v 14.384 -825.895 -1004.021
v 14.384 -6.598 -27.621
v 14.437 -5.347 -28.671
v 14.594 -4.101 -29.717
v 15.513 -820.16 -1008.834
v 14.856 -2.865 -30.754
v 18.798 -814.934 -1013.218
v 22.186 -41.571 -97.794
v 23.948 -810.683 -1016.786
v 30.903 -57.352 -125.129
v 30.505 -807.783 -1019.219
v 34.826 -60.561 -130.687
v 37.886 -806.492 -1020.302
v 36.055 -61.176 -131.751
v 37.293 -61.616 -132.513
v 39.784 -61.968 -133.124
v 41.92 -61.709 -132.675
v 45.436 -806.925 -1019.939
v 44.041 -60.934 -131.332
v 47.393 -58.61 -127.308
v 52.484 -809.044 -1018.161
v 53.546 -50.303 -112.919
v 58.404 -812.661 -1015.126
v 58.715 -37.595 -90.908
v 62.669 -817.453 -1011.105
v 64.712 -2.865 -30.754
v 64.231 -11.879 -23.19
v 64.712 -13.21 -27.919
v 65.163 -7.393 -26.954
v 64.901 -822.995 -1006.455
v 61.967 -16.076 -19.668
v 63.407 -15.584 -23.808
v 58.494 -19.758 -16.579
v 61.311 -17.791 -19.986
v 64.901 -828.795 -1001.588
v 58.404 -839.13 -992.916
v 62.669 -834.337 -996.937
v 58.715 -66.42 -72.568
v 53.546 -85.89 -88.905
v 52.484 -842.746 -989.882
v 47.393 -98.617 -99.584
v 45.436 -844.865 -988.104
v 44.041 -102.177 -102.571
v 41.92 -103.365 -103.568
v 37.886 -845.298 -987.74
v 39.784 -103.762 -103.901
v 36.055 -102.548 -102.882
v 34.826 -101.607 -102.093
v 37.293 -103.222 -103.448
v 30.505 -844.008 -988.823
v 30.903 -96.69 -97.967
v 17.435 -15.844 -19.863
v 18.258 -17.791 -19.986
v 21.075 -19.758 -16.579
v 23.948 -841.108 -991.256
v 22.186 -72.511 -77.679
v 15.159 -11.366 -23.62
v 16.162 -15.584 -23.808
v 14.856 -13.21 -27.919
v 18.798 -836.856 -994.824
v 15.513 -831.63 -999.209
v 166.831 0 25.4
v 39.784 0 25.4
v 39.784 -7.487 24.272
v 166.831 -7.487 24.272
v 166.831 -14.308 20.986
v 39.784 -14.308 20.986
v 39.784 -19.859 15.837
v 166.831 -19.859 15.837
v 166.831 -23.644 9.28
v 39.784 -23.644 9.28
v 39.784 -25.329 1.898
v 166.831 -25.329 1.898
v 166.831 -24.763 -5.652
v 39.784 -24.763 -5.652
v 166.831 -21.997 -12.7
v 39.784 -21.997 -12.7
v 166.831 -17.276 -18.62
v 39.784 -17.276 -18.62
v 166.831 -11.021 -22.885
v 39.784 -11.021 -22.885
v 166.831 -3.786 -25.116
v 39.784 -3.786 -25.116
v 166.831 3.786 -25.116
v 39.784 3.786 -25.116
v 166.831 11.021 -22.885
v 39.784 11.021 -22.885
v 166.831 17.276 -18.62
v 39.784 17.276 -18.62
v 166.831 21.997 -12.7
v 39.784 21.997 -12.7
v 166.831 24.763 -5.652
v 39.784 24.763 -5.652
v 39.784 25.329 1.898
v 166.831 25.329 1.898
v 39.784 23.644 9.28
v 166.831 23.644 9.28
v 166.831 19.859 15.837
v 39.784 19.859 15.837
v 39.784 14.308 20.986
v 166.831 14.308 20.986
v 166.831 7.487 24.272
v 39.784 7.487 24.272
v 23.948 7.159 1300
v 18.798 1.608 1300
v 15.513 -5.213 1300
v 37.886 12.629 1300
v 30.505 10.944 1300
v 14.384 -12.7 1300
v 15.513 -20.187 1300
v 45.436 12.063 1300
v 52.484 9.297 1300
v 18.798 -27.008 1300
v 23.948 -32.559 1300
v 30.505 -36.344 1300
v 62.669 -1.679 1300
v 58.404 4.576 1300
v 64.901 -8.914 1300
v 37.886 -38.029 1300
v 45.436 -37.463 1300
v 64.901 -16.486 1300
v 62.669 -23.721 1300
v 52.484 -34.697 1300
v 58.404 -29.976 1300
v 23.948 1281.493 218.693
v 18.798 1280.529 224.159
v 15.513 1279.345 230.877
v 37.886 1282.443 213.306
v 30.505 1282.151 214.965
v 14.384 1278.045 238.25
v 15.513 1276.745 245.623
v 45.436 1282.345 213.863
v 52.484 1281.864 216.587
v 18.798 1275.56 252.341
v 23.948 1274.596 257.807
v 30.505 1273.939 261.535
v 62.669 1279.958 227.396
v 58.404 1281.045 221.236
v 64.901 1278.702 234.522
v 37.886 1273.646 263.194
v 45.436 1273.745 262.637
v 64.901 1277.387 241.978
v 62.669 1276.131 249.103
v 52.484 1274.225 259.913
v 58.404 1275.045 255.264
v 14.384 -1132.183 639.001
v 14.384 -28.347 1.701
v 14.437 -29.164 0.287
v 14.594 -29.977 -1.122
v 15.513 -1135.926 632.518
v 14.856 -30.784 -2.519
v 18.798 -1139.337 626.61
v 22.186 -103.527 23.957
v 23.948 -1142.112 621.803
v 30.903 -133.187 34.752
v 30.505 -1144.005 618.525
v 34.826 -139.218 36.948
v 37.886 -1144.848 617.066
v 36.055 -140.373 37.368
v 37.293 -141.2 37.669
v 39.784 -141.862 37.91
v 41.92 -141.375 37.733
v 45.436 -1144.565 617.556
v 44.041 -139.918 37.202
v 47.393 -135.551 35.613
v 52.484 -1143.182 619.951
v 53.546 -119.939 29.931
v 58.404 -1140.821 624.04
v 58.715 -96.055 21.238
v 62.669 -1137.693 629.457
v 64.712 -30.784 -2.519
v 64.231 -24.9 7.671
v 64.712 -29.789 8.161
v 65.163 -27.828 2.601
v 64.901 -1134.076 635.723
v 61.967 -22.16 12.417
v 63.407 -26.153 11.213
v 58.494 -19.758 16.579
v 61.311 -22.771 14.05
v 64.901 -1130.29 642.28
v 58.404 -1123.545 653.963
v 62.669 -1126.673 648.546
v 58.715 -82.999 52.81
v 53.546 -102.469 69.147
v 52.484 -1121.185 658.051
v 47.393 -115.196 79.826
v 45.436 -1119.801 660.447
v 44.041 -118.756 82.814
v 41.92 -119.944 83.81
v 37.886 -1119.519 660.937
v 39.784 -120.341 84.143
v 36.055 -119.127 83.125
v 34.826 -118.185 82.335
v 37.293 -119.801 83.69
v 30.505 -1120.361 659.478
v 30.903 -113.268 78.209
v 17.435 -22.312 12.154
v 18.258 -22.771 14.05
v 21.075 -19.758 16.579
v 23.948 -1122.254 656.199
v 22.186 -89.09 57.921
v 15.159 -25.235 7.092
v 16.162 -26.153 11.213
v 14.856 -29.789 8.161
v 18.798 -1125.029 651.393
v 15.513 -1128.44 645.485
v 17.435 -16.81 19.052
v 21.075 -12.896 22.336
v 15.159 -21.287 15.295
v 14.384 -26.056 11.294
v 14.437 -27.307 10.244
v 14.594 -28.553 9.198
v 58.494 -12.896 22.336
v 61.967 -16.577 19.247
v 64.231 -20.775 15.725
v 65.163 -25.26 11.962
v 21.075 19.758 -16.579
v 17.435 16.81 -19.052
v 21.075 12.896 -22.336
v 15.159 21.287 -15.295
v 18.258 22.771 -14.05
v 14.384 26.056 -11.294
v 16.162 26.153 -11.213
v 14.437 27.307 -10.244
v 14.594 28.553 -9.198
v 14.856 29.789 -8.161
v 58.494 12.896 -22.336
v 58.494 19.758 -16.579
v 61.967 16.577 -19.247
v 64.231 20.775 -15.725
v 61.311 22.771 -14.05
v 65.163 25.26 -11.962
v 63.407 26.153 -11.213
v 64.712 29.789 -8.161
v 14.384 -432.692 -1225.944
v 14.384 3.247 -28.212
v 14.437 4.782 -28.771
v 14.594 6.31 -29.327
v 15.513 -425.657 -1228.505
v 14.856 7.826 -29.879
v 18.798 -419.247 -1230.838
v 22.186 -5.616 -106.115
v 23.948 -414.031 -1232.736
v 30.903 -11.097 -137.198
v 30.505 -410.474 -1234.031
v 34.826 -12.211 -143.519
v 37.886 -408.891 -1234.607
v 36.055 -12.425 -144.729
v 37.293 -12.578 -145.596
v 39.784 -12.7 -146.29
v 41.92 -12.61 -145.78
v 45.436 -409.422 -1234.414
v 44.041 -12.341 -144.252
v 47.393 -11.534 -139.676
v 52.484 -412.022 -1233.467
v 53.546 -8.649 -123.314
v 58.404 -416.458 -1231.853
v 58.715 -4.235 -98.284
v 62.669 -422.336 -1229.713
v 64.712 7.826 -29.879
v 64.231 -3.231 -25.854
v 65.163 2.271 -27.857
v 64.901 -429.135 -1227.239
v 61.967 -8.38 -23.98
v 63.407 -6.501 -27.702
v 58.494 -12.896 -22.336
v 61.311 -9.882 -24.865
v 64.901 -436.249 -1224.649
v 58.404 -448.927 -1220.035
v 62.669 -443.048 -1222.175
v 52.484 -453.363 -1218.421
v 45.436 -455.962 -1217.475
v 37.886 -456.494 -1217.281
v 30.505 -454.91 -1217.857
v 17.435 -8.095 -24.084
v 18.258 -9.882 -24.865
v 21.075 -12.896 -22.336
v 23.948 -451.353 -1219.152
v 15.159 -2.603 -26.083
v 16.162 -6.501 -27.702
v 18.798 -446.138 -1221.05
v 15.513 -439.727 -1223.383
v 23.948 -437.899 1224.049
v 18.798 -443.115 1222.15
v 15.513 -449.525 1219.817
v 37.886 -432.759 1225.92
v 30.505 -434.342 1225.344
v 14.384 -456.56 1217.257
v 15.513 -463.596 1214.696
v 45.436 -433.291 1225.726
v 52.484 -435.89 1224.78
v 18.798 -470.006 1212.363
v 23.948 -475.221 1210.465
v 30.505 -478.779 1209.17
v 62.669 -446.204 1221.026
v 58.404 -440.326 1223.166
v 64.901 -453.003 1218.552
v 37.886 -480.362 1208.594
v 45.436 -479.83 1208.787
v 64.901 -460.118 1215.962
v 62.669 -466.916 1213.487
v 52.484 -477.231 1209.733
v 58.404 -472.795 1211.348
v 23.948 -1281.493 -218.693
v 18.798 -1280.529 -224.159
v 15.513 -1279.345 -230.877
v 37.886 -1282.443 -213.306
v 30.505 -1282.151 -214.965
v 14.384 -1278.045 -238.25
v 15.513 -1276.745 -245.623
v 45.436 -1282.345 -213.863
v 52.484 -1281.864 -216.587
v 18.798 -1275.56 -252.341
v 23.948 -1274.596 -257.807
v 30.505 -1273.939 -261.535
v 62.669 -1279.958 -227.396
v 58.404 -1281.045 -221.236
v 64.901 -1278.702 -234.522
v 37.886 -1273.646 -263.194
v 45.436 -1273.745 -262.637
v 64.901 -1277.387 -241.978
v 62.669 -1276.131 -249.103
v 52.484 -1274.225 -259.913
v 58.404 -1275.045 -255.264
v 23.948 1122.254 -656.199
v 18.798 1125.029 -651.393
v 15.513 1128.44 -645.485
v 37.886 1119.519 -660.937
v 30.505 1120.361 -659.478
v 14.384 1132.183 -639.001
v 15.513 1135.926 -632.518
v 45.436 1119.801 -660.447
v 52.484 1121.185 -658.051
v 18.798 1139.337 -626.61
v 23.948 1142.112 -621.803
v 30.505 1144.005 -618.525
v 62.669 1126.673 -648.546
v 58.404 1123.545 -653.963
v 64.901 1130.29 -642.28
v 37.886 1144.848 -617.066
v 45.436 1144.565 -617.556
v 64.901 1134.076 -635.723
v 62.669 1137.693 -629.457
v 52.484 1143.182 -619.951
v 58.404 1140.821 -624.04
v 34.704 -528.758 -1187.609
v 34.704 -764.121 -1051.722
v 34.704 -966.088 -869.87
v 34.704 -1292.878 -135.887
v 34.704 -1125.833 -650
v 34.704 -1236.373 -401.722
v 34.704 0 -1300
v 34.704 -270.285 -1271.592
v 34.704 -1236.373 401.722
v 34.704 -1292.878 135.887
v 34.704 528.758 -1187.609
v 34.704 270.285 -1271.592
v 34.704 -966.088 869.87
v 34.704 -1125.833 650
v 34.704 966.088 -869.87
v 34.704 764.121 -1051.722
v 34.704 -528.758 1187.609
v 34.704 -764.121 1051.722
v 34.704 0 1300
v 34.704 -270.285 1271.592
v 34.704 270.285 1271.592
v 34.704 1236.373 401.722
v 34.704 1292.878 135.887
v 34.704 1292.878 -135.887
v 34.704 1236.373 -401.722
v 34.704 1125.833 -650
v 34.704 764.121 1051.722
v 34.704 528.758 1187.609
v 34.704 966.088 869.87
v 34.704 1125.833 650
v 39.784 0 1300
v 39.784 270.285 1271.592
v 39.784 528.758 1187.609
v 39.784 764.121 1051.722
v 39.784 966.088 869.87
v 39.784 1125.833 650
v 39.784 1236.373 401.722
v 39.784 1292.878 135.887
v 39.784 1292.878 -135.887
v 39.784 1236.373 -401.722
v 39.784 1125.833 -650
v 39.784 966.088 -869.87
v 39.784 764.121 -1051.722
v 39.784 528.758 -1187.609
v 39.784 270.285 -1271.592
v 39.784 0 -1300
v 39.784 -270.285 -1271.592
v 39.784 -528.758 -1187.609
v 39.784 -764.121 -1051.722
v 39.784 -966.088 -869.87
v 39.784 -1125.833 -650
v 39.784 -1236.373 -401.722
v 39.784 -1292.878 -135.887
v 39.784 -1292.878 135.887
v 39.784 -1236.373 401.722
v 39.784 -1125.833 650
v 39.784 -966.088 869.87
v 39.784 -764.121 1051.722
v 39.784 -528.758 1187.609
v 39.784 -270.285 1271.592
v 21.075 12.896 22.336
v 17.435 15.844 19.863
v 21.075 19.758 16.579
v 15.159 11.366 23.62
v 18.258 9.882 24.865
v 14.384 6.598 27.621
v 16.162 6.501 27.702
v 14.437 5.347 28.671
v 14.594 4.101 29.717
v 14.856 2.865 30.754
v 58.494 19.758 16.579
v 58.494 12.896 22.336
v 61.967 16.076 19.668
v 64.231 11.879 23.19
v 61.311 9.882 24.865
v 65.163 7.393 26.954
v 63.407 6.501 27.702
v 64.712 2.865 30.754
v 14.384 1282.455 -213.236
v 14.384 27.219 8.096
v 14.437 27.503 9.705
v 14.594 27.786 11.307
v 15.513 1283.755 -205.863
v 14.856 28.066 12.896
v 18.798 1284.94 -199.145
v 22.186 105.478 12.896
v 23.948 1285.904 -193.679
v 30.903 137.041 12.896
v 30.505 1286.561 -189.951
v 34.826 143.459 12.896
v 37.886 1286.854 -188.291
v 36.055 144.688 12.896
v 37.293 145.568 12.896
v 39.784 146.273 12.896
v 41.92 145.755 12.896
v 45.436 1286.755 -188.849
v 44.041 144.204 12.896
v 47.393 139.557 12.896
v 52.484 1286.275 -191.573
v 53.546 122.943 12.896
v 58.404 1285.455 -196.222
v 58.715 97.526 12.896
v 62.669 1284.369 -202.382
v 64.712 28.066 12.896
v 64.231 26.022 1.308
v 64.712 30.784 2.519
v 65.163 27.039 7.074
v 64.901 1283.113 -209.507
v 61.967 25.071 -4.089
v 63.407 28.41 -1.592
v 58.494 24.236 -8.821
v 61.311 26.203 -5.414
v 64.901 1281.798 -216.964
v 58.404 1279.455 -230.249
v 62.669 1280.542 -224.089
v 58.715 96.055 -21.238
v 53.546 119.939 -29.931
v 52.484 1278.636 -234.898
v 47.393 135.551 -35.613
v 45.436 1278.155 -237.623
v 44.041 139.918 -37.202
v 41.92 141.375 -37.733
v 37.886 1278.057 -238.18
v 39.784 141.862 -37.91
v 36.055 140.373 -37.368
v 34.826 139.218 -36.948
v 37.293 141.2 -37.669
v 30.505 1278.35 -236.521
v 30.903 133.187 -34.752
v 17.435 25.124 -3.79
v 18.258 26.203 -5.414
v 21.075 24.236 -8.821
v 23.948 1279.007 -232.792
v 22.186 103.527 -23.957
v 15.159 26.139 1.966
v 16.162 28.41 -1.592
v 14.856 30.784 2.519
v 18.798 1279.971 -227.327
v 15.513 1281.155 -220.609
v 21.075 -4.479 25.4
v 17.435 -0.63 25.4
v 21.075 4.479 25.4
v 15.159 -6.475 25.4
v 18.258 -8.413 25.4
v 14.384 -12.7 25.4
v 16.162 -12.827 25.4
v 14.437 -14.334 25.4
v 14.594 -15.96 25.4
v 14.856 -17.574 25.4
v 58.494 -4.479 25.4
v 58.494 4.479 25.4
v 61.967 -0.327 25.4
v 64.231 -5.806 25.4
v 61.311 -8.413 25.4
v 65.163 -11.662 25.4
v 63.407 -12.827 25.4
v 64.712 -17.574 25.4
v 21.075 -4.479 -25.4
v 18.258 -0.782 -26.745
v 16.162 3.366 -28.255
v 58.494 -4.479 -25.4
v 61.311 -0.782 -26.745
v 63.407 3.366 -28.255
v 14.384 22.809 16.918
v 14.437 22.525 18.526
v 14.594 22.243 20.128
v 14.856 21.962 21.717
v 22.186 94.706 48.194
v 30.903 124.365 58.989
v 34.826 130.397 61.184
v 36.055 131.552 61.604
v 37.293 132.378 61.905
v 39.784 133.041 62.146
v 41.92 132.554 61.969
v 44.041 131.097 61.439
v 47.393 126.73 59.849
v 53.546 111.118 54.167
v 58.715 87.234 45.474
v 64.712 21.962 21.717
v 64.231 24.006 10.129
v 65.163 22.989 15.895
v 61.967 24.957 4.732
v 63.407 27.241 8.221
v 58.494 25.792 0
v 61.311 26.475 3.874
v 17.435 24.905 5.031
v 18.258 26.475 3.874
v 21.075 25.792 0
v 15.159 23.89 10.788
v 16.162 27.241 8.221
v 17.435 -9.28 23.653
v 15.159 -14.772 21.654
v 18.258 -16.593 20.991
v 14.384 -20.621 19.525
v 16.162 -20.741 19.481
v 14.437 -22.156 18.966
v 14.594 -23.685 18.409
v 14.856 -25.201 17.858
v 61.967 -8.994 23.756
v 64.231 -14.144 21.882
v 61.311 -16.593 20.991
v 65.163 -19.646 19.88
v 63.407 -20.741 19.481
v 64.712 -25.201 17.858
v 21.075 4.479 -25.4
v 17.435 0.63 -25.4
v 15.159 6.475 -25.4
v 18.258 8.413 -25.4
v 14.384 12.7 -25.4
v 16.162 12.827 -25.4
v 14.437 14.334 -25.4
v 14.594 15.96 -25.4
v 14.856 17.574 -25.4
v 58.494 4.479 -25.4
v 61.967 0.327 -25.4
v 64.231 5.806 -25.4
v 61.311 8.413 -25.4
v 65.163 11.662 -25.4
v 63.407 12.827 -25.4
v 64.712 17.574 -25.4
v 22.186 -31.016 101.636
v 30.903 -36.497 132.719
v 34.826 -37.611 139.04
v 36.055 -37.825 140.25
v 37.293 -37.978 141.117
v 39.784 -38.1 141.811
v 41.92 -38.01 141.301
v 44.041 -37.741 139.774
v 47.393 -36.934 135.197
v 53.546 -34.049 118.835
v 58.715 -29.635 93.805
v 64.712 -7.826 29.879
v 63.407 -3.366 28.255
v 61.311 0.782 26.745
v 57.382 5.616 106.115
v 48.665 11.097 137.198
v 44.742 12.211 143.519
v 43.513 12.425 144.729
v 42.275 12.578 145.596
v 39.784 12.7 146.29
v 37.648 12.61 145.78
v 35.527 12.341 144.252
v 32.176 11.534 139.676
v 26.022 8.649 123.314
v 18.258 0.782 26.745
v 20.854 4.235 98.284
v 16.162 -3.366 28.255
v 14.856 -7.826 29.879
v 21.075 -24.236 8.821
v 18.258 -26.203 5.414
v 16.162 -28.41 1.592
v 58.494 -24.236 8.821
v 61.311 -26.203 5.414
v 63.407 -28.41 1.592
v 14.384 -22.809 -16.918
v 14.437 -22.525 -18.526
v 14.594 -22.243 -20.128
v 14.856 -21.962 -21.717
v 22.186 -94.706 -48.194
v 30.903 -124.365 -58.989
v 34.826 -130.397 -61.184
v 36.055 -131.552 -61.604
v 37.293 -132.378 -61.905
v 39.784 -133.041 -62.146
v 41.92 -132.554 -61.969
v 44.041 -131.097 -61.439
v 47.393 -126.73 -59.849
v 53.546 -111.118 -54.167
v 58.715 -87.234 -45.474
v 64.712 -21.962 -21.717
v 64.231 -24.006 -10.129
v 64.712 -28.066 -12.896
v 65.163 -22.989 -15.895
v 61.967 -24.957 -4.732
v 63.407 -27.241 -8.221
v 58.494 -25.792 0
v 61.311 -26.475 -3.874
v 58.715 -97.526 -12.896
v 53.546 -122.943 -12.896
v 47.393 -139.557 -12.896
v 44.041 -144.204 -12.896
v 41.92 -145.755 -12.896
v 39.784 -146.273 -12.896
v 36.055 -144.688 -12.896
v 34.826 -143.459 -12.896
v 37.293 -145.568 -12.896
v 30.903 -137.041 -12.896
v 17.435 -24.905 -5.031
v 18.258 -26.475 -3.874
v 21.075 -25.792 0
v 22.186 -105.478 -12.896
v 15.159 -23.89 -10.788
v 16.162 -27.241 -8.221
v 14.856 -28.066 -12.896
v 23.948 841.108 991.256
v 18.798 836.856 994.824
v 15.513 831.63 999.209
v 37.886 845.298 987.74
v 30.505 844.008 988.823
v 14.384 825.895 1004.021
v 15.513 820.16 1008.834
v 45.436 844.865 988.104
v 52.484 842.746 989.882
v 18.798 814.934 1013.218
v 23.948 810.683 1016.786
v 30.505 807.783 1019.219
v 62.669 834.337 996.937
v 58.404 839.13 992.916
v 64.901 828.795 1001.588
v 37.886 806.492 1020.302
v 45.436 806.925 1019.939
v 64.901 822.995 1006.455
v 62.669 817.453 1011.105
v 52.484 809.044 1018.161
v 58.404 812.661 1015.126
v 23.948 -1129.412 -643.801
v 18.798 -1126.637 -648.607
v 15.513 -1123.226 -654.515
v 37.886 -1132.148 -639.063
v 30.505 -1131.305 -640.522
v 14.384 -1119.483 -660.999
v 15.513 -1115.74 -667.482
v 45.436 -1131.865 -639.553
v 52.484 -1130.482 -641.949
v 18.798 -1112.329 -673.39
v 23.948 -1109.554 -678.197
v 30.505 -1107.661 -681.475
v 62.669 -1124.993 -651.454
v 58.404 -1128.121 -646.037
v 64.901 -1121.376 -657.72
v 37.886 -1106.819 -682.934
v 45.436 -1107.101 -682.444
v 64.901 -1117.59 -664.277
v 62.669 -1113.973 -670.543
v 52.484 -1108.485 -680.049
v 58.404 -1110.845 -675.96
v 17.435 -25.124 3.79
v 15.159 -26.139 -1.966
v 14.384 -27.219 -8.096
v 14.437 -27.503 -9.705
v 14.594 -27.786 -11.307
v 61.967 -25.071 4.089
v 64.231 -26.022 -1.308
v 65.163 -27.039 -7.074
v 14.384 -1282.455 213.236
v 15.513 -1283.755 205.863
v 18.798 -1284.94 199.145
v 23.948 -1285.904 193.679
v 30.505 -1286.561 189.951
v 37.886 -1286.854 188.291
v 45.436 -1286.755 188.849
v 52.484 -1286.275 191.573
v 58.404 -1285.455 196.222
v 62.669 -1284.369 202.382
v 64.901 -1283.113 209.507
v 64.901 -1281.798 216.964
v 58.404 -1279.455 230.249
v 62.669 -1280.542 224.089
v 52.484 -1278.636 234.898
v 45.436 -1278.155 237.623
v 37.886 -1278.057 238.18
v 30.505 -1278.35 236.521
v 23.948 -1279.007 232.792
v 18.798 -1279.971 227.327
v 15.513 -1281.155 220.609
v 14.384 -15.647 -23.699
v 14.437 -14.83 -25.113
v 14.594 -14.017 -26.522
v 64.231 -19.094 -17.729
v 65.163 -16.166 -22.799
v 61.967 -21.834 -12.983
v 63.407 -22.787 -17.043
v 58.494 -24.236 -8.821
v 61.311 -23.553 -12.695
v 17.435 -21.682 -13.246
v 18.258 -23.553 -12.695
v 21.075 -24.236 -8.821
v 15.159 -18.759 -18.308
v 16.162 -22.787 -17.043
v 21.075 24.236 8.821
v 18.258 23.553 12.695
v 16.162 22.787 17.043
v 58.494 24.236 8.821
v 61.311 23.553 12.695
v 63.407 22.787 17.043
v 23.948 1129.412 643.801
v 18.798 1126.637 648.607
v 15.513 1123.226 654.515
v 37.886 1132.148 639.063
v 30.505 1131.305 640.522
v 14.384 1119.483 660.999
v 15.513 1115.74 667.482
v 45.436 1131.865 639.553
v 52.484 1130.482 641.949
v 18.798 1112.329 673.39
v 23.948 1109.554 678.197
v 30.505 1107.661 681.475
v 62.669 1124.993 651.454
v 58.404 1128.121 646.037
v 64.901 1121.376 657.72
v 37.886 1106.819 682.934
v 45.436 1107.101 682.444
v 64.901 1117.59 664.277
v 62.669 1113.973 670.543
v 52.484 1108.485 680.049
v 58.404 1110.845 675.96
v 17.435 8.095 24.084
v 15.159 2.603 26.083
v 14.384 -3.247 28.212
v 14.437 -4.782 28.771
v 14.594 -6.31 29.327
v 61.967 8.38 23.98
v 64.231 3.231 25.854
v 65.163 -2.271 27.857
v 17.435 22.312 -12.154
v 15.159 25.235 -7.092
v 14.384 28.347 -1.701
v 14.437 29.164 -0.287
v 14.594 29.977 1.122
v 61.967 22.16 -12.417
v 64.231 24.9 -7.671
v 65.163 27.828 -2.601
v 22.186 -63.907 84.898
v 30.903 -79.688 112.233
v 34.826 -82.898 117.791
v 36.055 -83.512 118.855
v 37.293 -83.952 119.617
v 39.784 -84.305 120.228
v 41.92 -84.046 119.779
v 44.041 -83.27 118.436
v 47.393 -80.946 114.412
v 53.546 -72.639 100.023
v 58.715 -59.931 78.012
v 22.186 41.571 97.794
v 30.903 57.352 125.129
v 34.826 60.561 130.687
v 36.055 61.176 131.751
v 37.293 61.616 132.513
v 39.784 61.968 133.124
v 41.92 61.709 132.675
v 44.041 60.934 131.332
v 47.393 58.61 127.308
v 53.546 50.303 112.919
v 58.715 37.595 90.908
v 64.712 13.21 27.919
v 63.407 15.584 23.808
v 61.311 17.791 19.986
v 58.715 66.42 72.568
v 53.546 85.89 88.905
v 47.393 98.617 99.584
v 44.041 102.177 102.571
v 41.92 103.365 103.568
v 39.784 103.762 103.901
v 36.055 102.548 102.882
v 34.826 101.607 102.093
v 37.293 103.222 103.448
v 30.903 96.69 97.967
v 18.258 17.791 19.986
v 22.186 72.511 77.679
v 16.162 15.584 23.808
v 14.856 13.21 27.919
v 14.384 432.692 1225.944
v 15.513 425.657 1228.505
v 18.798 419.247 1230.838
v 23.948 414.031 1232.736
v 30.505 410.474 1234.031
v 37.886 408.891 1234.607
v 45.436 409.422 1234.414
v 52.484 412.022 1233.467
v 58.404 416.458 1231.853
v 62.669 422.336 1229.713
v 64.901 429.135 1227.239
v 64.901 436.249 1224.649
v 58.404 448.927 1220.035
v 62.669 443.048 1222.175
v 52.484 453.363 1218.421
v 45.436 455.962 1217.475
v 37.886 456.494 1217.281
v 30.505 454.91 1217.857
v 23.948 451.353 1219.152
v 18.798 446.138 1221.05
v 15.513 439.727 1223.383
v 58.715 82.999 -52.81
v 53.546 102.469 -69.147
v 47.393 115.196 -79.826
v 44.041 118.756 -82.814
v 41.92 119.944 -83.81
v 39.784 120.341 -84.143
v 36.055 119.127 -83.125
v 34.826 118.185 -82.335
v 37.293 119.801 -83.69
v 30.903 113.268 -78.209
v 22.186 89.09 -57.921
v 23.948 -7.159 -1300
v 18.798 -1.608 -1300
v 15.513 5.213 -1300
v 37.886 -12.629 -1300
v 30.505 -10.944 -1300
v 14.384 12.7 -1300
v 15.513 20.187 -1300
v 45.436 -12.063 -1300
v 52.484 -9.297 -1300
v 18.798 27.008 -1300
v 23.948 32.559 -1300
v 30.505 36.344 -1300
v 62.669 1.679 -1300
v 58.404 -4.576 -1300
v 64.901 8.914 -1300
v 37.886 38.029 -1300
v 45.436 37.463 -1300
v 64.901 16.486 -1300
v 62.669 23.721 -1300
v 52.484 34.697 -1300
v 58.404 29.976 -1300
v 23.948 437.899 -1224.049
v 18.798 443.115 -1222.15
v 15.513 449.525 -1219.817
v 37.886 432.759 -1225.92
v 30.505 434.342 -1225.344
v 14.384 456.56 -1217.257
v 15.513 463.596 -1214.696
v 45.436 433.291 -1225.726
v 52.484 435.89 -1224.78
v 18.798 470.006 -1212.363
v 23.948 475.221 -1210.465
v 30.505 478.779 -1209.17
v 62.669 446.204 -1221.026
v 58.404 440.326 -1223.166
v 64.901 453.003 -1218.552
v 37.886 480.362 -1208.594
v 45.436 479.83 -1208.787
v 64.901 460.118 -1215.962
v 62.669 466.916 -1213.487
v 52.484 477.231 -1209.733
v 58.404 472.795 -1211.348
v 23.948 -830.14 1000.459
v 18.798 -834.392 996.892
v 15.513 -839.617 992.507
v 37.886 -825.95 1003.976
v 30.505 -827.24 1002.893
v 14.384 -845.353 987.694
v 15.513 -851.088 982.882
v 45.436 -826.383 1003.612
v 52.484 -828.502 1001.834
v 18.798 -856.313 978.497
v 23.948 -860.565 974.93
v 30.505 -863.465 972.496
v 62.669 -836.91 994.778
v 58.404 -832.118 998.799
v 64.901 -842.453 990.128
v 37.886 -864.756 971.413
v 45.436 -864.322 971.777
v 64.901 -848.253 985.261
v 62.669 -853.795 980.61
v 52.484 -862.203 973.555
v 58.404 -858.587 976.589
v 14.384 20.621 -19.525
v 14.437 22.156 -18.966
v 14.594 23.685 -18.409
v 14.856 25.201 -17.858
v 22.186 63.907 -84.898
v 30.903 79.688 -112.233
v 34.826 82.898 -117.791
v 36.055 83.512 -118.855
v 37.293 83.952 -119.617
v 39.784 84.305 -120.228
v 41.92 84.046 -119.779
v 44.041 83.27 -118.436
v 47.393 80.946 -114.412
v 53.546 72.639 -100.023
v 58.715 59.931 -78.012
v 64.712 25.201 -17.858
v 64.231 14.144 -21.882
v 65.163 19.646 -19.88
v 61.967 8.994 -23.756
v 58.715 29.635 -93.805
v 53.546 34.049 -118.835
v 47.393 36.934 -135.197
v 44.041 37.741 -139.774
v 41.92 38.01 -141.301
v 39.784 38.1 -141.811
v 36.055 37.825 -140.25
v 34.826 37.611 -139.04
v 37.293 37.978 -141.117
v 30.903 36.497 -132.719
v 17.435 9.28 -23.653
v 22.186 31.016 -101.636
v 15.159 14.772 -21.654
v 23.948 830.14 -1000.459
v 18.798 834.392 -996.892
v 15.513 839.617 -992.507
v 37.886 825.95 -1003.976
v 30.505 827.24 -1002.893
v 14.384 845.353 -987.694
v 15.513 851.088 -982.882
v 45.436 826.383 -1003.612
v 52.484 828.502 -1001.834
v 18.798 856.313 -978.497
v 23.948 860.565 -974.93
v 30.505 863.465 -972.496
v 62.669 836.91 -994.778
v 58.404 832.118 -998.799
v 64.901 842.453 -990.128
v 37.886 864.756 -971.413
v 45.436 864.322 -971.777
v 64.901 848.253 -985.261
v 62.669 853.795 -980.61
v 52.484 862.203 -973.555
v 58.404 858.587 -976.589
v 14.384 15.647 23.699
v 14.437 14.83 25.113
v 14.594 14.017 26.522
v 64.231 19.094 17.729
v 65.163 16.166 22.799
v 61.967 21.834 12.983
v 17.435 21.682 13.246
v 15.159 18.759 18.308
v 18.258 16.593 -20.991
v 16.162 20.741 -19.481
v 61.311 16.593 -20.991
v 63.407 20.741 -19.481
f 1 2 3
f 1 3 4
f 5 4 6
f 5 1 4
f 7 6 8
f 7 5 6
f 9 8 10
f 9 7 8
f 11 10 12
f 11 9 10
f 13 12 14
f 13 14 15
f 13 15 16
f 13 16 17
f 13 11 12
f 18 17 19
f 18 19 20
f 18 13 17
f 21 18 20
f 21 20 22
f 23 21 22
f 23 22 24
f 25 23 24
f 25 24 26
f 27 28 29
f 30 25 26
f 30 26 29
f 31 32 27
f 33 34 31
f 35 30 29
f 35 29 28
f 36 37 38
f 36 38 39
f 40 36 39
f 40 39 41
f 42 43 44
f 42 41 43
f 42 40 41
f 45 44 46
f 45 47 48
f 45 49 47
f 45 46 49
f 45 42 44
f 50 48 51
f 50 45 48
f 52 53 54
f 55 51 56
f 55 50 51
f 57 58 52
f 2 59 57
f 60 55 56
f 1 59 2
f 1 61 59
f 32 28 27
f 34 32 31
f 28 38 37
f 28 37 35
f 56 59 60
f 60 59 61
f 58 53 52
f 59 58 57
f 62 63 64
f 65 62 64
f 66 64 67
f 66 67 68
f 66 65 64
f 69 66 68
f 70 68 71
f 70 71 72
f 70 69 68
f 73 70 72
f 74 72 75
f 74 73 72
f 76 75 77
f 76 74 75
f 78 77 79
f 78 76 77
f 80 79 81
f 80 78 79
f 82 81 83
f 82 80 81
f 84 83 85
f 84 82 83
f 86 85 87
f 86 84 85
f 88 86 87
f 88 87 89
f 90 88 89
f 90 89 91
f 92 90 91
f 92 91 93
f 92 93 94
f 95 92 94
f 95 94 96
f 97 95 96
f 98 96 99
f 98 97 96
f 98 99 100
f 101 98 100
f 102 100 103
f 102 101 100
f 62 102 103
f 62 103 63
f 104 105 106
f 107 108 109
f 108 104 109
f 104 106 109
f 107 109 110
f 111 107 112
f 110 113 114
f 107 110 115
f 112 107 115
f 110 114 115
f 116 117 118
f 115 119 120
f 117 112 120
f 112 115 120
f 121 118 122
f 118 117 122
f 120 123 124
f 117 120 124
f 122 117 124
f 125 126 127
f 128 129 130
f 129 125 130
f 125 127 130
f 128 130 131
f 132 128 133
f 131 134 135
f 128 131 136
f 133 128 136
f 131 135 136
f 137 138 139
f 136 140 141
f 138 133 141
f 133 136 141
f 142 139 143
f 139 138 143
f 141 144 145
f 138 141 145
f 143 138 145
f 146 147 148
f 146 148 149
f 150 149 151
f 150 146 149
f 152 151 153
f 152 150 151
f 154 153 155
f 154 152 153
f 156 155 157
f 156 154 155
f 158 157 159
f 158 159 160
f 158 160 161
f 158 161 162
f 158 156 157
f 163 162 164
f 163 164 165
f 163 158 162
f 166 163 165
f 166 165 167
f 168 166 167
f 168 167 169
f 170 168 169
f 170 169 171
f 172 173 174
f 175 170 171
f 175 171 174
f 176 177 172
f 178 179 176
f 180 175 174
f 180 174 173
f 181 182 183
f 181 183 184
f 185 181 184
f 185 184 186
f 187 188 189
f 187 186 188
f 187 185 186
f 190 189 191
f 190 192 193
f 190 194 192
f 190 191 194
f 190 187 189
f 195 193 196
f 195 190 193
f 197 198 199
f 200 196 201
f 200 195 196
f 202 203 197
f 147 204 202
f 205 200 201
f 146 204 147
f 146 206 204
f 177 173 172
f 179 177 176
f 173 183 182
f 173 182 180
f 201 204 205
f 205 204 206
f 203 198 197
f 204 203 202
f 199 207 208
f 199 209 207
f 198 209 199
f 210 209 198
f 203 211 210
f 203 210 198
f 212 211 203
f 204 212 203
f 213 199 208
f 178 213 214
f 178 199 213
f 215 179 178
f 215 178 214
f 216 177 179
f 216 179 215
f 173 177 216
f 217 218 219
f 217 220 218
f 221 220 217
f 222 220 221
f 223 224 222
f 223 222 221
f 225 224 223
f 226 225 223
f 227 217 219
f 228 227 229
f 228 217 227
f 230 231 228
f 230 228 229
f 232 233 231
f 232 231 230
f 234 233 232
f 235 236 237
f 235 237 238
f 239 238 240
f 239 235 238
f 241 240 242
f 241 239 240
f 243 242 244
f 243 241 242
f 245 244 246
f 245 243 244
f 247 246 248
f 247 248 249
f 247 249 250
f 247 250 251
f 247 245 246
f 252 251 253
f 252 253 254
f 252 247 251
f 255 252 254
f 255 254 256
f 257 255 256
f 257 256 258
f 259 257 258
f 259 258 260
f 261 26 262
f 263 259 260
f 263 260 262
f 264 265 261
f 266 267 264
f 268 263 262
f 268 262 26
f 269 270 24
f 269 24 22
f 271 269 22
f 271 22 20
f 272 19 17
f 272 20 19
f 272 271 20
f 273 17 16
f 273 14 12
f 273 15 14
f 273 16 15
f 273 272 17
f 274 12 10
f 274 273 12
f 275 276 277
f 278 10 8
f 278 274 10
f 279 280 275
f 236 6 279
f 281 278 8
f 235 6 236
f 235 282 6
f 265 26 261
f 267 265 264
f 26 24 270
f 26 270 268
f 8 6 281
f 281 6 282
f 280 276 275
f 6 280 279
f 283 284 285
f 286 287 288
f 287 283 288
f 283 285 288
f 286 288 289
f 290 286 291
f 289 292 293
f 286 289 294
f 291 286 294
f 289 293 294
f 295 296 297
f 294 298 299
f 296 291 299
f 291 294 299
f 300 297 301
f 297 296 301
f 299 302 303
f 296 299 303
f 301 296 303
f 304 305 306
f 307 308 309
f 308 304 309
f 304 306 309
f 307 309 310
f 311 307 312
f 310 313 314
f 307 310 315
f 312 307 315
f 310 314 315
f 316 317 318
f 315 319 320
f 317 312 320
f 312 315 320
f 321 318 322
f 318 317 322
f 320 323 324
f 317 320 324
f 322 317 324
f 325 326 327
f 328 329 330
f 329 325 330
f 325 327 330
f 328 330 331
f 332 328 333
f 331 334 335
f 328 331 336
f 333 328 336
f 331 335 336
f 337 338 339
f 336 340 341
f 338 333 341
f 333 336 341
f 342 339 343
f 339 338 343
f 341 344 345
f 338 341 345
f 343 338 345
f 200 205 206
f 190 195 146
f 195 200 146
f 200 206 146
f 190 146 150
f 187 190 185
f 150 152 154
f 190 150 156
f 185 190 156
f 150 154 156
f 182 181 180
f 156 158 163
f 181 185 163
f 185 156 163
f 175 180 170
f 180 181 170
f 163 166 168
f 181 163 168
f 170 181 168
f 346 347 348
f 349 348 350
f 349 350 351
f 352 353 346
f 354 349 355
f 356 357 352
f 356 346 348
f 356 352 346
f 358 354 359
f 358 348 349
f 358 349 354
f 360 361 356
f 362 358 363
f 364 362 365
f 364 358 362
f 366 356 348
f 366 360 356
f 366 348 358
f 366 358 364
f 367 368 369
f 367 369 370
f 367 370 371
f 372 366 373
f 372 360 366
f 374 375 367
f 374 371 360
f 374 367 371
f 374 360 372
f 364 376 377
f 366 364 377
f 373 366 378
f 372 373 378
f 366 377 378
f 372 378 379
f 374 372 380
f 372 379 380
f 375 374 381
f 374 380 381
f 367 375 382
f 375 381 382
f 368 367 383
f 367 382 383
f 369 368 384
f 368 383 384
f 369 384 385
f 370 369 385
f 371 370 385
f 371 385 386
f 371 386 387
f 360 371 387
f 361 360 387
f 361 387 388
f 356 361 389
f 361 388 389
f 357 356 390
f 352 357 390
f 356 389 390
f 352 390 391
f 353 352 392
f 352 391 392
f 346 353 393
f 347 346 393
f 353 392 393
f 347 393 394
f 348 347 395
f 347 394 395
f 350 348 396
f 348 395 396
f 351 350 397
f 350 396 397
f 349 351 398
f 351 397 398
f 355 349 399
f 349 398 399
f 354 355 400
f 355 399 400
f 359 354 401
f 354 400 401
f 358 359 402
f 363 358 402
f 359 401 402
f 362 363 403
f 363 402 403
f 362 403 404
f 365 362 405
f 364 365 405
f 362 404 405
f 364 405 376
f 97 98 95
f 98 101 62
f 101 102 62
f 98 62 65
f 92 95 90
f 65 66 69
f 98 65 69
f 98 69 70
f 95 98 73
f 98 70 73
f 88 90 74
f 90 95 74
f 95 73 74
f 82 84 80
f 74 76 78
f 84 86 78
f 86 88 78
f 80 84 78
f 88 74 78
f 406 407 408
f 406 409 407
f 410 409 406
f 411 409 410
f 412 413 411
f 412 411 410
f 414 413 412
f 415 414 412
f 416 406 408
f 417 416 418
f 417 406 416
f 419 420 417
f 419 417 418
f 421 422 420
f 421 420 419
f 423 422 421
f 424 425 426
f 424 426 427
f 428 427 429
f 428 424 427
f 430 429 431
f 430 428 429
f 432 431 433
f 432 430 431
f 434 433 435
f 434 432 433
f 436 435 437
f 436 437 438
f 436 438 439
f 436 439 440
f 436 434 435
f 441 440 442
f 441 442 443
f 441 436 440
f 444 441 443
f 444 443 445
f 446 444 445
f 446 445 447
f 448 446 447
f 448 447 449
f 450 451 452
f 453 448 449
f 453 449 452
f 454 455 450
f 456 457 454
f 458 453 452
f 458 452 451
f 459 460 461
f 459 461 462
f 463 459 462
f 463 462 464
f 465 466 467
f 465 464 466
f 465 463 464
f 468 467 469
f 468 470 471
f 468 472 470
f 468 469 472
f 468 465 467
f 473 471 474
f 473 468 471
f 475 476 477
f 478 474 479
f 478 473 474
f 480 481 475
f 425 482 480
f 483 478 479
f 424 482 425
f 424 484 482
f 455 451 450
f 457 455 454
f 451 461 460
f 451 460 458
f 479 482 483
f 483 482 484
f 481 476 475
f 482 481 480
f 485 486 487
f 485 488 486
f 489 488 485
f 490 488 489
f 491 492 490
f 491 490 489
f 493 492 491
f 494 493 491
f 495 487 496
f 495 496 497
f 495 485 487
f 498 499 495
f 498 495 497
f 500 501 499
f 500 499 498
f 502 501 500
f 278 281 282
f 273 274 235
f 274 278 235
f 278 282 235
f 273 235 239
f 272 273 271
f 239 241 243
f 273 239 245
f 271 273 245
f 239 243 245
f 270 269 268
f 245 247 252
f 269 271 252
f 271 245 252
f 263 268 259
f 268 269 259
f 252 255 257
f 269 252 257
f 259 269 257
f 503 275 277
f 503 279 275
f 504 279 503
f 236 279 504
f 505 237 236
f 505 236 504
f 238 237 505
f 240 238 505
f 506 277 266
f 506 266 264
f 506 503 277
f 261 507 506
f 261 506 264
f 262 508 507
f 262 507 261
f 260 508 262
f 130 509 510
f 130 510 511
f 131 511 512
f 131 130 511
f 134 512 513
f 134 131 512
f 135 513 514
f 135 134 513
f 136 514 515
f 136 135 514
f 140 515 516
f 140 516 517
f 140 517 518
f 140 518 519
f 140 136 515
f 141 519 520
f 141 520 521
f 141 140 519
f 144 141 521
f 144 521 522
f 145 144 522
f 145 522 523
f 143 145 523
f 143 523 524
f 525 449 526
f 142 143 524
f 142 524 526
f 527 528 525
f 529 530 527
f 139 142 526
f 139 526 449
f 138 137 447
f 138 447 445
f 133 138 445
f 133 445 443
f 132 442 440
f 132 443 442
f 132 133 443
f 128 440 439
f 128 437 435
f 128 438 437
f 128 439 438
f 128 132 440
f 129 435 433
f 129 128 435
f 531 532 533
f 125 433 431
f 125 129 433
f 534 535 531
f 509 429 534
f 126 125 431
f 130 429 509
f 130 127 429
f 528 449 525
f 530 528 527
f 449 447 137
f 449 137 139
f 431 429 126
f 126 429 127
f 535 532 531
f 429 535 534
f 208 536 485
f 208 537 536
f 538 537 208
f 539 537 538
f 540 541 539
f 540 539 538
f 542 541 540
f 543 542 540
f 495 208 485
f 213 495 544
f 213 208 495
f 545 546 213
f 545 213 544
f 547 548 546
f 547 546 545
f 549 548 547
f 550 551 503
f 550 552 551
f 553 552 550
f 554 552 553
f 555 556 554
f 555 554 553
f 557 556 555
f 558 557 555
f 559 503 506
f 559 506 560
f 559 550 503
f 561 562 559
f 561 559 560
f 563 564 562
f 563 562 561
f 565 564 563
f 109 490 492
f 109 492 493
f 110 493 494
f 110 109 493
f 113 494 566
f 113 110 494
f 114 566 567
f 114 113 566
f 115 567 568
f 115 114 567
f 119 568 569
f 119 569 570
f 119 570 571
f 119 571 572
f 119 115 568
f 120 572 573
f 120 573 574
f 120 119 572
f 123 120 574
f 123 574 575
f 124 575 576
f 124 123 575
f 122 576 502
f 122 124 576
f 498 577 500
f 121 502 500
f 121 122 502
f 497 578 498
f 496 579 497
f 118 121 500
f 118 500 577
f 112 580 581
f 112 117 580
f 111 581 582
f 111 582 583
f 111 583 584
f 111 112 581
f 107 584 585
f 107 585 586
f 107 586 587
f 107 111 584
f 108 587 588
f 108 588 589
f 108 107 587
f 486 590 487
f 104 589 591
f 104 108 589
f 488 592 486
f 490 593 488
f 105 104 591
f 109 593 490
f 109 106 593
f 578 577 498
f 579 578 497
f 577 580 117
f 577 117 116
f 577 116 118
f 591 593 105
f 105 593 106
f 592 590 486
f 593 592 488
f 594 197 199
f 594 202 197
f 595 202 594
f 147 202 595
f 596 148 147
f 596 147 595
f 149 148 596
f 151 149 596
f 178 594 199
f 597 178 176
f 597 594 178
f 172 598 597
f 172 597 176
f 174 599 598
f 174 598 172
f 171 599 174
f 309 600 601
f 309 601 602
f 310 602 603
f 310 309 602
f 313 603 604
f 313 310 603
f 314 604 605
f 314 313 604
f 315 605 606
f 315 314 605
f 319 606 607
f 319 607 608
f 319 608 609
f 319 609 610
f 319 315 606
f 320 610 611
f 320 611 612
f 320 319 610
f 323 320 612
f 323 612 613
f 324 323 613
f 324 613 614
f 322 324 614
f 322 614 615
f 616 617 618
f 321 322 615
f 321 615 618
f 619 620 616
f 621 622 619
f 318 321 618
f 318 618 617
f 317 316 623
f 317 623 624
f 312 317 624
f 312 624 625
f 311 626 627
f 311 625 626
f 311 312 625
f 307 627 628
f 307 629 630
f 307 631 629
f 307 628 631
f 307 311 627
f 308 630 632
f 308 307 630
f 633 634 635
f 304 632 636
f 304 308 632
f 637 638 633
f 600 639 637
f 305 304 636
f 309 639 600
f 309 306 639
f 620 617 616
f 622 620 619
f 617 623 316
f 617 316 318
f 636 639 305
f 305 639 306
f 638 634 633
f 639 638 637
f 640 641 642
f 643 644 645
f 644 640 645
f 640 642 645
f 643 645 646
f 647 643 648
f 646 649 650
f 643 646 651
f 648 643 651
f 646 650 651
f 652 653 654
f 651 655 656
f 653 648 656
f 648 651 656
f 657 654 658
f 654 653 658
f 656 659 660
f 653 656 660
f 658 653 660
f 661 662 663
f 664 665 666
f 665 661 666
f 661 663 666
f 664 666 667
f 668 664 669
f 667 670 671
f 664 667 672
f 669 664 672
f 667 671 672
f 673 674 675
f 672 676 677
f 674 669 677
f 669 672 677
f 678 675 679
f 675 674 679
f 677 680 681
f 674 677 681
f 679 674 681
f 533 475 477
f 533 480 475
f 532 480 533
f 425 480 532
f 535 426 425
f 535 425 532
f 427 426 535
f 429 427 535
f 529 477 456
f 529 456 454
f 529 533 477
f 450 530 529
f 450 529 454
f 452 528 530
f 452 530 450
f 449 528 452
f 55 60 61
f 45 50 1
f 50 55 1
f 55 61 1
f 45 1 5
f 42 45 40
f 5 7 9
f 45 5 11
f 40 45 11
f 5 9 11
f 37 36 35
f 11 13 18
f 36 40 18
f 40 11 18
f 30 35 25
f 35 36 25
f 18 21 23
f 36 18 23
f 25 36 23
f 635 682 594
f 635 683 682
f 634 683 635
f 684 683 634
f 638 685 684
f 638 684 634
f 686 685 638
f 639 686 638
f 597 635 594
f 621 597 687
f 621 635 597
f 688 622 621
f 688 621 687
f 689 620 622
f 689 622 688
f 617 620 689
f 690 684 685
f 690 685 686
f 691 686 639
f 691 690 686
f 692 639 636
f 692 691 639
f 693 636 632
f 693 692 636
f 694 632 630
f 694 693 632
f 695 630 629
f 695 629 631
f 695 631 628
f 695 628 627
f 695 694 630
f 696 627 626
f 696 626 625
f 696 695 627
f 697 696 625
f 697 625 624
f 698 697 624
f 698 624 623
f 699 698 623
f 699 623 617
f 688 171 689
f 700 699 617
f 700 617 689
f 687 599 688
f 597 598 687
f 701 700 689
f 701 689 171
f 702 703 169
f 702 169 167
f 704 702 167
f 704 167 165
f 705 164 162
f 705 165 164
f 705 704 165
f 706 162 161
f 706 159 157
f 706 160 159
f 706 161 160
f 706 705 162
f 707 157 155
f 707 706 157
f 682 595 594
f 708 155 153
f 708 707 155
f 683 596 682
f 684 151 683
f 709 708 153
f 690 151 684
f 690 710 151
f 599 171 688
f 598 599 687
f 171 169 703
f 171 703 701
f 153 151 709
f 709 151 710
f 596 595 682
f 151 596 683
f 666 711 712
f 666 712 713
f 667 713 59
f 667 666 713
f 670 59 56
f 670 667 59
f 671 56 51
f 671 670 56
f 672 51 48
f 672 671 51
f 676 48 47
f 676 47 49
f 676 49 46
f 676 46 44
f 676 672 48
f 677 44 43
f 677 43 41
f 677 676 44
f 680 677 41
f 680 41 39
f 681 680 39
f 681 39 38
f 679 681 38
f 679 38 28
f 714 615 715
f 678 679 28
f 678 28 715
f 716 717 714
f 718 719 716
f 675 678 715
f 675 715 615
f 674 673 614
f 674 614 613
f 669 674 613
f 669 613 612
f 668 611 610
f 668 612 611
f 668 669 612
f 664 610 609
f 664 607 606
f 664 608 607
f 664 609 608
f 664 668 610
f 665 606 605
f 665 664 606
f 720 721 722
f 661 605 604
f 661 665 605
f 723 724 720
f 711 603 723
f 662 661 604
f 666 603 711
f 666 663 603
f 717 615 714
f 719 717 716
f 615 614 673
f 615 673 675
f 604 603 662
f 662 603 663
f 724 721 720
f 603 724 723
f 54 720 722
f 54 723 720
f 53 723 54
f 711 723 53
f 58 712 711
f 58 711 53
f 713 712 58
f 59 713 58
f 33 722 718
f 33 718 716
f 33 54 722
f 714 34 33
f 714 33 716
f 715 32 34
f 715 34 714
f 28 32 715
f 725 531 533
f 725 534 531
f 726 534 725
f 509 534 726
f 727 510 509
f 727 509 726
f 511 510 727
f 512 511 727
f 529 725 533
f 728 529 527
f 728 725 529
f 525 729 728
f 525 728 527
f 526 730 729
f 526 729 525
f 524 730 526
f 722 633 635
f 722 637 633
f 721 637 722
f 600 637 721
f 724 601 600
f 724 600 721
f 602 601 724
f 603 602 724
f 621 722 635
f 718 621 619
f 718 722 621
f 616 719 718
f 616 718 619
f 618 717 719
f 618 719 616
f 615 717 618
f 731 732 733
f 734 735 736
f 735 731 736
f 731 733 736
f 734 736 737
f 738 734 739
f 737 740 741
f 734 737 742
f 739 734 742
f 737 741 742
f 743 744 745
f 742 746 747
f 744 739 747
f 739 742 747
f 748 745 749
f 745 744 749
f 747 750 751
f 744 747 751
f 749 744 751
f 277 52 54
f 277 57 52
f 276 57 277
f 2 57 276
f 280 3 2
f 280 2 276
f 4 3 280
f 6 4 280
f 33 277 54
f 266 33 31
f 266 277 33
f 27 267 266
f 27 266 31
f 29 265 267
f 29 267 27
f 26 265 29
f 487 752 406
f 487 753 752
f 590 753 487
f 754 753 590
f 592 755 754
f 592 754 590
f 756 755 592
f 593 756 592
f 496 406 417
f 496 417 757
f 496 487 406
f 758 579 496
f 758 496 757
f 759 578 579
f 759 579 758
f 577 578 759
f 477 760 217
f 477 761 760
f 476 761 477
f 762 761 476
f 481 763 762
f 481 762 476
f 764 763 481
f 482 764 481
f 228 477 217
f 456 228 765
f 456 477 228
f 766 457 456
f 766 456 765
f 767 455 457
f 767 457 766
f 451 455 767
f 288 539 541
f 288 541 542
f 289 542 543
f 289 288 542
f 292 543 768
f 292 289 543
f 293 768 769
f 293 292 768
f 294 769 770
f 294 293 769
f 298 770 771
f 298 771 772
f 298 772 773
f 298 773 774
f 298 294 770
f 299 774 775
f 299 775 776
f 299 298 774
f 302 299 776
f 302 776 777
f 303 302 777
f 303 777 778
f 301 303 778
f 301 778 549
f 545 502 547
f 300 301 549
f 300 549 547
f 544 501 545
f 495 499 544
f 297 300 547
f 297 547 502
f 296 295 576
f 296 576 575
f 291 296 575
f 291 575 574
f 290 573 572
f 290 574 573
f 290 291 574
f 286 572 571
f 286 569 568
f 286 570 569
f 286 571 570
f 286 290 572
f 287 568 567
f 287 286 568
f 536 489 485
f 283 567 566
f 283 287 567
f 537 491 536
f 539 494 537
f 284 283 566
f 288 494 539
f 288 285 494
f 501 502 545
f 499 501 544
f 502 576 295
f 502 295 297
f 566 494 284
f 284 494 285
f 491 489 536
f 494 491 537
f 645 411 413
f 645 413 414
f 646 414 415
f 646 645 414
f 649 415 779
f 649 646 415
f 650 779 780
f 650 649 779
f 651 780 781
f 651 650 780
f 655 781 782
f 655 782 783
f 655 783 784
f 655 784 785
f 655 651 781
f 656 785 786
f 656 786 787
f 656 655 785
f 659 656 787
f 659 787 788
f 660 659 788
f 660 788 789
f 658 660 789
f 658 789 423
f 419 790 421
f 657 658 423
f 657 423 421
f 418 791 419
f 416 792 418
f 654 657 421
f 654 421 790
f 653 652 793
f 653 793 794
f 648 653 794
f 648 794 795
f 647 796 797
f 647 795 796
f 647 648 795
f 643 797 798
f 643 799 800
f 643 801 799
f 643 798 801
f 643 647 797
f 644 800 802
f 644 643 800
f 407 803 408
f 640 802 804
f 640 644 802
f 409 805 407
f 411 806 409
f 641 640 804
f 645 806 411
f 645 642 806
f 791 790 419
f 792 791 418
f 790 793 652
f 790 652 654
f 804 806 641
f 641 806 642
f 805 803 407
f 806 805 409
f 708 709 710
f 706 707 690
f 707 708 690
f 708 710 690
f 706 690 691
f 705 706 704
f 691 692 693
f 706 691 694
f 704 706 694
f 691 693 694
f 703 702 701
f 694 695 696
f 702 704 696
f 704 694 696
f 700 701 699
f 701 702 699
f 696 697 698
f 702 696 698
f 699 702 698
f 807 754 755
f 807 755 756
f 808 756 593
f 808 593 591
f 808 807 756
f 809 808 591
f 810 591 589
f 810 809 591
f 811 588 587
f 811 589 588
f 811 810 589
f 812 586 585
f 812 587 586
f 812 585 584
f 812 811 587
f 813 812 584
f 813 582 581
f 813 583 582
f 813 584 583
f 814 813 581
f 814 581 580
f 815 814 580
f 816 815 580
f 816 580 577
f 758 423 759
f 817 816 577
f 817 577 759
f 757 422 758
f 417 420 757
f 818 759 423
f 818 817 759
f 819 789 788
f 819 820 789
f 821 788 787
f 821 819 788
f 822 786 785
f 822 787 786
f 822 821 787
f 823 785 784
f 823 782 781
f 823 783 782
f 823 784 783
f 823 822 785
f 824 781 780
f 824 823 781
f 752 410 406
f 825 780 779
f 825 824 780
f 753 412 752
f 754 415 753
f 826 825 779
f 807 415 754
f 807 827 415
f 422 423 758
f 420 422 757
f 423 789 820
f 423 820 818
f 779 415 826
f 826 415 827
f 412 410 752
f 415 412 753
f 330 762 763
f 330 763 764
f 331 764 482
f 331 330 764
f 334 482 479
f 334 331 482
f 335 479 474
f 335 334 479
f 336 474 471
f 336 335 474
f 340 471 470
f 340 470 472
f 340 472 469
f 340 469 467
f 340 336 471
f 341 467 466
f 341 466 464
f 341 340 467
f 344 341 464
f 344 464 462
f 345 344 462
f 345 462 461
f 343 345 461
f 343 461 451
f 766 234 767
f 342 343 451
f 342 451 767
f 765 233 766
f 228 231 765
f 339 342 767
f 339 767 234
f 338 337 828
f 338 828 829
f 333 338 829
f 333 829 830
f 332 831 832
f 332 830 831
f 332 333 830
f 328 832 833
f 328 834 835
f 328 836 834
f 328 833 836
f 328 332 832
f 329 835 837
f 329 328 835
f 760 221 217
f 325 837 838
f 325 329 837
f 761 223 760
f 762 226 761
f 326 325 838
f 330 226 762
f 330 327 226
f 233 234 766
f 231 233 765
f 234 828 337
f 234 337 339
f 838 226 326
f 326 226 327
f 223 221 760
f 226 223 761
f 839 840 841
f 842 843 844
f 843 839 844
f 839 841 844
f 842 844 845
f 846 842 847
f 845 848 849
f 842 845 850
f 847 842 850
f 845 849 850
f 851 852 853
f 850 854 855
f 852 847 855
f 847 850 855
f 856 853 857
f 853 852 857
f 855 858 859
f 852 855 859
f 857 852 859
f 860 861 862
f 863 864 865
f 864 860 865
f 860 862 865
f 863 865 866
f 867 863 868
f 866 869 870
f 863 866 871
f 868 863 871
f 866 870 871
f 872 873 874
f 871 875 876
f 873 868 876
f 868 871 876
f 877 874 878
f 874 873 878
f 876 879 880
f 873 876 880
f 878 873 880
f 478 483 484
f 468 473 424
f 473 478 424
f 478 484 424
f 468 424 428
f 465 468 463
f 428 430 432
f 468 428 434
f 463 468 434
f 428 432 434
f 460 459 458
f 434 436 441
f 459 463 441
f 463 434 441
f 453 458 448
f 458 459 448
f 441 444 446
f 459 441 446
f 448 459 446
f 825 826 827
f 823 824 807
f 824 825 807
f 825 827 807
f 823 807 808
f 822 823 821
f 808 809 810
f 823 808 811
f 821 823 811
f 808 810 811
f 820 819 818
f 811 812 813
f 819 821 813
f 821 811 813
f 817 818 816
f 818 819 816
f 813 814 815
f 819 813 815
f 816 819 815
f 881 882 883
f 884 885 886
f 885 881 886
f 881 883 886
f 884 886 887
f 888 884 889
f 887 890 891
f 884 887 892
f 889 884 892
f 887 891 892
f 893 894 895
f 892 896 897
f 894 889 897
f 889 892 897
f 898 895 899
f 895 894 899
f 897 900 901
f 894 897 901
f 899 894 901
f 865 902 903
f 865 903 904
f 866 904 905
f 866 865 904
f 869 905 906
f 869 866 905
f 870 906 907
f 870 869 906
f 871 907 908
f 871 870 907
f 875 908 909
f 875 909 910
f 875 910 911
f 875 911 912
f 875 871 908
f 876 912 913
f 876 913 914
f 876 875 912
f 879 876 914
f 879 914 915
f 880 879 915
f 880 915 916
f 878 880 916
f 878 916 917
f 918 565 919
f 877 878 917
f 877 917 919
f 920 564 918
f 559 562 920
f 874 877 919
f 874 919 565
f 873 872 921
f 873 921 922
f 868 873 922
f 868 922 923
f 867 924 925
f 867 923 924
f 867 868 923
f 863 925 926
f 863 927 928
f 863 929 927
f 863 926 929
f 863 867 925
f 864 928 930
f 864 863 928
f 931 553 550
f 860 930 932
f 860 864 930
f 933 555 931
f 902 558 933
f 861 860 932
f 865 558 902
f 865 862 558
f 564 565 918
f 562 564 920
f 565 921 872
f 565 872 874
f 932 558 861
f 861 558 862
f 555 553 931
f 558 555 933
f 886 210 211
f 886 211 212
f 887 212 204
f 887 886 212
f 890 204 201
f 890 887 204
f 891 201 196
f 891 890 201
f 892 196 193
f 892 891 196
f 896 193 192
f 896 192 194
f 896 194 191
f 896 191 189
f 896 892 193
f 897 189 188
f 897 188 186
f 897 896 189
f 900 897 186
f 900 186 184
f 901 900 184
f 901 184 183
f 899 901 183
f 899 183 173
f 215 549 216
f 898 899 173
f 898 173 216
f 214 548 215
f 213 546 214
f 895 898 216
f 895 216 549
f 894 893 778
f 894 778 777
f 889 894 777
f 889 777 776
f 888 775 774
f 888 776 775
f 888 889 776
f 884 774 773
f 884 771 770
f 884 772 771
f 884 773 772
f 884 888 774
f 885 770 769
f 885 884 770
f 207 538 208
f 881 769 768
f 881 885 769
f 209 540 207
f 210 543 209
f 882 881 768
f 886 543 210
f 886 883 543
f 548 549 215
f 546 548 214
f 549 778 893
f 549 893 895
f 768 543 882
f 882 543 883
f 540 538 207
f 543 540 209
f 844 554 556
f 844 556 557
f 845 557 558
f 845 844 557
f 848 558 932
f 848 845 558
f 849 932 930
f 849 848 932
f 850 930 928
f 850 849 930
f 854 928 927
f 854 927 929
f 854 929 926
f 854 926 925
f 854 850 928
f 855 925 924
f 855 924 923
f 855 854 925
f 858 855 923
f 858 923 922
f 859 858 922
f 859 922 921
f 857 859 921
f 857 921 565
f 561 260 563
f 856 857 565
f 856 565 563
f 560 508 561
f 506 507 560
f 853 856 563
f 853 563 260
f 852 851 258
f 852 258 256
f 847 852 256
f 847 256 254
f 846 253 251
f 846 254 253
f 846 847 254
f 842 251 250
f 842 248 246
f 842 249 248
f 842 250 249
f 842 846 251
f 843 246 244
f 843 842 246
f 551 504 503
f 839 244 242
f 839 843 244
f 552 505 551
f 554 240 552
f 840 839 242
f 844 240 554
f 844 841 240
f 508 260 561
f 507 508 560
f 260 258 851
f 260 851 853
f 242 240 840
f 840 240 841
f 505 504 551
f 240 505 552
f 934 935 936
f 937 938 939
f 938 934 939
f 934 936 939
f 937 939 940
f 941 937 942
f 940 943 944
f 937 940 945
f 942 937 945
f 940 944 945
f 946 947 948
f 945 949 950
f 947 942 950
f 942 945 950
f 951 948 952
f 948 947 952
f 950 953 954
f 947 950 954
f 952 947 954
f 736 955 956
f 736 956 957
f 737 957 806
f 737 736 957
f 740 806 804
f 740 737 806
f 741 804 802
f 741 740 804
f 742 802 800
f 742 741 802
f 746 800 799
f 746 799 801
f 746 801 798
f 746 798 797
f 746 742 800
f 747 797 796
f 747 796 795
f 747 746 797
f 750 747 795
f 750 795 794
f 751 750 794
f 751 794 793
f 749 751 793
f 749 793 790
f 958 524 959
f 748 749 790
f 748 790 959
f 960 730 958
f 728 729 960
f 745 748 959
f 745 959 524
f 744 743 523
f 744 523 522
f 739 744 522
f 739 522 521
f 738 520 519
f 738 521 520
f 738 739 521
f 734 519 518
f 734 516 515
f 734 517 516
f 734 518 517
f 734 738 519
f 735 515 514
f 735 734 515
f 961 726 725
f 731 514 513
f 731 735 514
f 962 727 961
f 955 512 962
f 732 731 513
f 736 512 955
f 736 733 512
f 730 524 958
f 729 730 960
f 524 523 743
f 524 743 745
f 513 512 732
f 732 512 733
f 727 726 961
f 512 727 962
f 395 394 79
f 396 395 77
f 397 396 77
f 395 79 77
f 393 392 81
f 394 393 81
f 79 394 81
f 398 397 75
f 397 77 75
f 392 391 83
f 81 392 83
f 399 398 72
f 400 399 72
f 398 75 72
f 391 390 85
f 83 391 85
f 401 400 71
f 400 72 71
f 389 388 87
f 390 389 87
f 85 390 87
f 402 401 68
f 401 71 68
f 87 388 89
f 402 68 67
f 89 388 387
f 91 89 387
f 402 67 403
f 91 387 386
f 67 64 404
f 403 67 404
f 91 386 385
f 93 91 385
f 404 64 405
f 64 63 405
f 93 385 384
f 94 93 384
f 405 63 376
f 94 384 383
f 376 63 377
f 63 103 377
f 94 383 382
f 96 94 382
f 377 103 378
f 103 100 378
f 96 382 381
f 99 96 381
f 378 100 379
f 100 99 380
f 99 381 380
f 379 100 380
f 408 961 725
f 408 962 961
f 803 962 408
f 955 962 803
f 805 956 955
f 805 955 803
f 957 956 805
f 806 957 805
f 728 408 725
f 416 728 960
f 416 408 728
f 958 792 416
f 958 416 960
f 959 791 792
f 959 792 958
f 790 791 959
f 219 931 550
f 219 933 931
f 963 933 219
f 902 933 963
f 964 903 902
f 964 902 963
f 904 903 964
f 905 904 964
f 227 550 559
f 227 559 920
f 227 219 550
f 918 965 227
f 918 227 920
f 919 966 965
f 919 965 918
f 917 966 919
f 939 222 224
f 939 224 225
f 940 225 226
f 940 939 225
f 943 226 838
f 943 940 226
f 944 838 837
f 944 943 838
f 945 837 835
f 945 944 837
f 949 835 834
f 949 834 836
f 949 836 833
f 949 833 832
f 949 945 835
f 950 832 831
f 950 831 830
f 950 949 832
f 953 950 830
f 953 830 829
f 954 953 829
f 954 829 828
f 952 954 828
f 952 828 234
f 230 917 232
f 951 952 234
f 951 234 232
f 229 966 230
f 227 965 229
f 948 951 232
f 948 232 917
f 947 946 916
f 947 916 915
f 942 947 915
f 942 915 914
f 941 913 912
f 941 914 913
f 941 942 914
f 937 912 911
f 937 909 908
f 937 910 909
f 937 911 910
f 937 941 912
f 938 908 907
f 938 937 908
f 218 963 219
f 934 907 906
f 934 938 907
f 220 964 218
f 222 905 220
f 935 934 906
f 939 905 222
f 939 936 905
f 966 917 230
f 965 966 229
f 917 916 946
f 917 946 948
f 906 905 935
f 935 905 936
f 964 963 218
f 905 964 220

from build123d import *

# Parameters (mm, degrees)
SKETCH3_W           = 127.046882492
SKETCH3_H           = 25.4
SKETCH6_W           = 1274.6
SKETCH6_H           = 25.4
SKETCH7_R           = 1300
BOSS_EXTRUDE2_DEPTH = 5.08
CIRPATTERN1_COUNT   = 18


with BuildPart() as part:
    # Sketch3 → Revolve2 (revolve)
    with BuildSketch(Plane(origin=(39.784286719, 0, 0), x_dir=(1, 0, 0), z_dir=(0, 0, 1)), mode=Mode.PRIVATE) as revolve2_sk:
        with Locations((63.523441246, 12.7)):
            Rectangle(SKETCH3_W, SKETCH3_H)
    revolve(revolve2_sk.sketch.rotate(Axis((39.784286719, 0, 0), (1, 0, 0)), 90), axis=Axis((39.784286719, 0, 0), (1, 0, 0)))

    # Sketch7 → Boss-Extrude2 (add)
    with BuildSketch(Plane.ZY.offset(-39.784286719)):
        Circle(SKETCH7_R)
    extrude(amount=BOSS_EXTRUDE2_DEPTH)


with BuildPart() as body_2:
    # Sketch6 → Revolve3 (revolve)
    with BuildSketch(Plane.ZY.offset(-39.784286719), mode=Mode.PRIVATE) as revolve3_sk:
        with Locations((662.7, 0)):
            Rectangle(SKETCH6_W, SKETCH6_H)
    revolve3 = revolve(revolve3_sk.sketch.rotate(Axis((39.784286719, -12.7, 25.4), (0, 0, 1)), 90), axis=Axis((39.784286719, -12.7, 25.4), (0, 0, 1)))

    # CirPattern1: Revolve3 ×18 about axis
    cirpattern1_axis = Axis((0, 0, 0), (1, 0, 0))
    for i in range(1, CIRPATTERN1_COUNT):
        add(revolve3.rotate(cirpattern1_axis, i * 360 / CIRPATTERN1_COUNT))


solid = Compound([part.part, body_2.part])
